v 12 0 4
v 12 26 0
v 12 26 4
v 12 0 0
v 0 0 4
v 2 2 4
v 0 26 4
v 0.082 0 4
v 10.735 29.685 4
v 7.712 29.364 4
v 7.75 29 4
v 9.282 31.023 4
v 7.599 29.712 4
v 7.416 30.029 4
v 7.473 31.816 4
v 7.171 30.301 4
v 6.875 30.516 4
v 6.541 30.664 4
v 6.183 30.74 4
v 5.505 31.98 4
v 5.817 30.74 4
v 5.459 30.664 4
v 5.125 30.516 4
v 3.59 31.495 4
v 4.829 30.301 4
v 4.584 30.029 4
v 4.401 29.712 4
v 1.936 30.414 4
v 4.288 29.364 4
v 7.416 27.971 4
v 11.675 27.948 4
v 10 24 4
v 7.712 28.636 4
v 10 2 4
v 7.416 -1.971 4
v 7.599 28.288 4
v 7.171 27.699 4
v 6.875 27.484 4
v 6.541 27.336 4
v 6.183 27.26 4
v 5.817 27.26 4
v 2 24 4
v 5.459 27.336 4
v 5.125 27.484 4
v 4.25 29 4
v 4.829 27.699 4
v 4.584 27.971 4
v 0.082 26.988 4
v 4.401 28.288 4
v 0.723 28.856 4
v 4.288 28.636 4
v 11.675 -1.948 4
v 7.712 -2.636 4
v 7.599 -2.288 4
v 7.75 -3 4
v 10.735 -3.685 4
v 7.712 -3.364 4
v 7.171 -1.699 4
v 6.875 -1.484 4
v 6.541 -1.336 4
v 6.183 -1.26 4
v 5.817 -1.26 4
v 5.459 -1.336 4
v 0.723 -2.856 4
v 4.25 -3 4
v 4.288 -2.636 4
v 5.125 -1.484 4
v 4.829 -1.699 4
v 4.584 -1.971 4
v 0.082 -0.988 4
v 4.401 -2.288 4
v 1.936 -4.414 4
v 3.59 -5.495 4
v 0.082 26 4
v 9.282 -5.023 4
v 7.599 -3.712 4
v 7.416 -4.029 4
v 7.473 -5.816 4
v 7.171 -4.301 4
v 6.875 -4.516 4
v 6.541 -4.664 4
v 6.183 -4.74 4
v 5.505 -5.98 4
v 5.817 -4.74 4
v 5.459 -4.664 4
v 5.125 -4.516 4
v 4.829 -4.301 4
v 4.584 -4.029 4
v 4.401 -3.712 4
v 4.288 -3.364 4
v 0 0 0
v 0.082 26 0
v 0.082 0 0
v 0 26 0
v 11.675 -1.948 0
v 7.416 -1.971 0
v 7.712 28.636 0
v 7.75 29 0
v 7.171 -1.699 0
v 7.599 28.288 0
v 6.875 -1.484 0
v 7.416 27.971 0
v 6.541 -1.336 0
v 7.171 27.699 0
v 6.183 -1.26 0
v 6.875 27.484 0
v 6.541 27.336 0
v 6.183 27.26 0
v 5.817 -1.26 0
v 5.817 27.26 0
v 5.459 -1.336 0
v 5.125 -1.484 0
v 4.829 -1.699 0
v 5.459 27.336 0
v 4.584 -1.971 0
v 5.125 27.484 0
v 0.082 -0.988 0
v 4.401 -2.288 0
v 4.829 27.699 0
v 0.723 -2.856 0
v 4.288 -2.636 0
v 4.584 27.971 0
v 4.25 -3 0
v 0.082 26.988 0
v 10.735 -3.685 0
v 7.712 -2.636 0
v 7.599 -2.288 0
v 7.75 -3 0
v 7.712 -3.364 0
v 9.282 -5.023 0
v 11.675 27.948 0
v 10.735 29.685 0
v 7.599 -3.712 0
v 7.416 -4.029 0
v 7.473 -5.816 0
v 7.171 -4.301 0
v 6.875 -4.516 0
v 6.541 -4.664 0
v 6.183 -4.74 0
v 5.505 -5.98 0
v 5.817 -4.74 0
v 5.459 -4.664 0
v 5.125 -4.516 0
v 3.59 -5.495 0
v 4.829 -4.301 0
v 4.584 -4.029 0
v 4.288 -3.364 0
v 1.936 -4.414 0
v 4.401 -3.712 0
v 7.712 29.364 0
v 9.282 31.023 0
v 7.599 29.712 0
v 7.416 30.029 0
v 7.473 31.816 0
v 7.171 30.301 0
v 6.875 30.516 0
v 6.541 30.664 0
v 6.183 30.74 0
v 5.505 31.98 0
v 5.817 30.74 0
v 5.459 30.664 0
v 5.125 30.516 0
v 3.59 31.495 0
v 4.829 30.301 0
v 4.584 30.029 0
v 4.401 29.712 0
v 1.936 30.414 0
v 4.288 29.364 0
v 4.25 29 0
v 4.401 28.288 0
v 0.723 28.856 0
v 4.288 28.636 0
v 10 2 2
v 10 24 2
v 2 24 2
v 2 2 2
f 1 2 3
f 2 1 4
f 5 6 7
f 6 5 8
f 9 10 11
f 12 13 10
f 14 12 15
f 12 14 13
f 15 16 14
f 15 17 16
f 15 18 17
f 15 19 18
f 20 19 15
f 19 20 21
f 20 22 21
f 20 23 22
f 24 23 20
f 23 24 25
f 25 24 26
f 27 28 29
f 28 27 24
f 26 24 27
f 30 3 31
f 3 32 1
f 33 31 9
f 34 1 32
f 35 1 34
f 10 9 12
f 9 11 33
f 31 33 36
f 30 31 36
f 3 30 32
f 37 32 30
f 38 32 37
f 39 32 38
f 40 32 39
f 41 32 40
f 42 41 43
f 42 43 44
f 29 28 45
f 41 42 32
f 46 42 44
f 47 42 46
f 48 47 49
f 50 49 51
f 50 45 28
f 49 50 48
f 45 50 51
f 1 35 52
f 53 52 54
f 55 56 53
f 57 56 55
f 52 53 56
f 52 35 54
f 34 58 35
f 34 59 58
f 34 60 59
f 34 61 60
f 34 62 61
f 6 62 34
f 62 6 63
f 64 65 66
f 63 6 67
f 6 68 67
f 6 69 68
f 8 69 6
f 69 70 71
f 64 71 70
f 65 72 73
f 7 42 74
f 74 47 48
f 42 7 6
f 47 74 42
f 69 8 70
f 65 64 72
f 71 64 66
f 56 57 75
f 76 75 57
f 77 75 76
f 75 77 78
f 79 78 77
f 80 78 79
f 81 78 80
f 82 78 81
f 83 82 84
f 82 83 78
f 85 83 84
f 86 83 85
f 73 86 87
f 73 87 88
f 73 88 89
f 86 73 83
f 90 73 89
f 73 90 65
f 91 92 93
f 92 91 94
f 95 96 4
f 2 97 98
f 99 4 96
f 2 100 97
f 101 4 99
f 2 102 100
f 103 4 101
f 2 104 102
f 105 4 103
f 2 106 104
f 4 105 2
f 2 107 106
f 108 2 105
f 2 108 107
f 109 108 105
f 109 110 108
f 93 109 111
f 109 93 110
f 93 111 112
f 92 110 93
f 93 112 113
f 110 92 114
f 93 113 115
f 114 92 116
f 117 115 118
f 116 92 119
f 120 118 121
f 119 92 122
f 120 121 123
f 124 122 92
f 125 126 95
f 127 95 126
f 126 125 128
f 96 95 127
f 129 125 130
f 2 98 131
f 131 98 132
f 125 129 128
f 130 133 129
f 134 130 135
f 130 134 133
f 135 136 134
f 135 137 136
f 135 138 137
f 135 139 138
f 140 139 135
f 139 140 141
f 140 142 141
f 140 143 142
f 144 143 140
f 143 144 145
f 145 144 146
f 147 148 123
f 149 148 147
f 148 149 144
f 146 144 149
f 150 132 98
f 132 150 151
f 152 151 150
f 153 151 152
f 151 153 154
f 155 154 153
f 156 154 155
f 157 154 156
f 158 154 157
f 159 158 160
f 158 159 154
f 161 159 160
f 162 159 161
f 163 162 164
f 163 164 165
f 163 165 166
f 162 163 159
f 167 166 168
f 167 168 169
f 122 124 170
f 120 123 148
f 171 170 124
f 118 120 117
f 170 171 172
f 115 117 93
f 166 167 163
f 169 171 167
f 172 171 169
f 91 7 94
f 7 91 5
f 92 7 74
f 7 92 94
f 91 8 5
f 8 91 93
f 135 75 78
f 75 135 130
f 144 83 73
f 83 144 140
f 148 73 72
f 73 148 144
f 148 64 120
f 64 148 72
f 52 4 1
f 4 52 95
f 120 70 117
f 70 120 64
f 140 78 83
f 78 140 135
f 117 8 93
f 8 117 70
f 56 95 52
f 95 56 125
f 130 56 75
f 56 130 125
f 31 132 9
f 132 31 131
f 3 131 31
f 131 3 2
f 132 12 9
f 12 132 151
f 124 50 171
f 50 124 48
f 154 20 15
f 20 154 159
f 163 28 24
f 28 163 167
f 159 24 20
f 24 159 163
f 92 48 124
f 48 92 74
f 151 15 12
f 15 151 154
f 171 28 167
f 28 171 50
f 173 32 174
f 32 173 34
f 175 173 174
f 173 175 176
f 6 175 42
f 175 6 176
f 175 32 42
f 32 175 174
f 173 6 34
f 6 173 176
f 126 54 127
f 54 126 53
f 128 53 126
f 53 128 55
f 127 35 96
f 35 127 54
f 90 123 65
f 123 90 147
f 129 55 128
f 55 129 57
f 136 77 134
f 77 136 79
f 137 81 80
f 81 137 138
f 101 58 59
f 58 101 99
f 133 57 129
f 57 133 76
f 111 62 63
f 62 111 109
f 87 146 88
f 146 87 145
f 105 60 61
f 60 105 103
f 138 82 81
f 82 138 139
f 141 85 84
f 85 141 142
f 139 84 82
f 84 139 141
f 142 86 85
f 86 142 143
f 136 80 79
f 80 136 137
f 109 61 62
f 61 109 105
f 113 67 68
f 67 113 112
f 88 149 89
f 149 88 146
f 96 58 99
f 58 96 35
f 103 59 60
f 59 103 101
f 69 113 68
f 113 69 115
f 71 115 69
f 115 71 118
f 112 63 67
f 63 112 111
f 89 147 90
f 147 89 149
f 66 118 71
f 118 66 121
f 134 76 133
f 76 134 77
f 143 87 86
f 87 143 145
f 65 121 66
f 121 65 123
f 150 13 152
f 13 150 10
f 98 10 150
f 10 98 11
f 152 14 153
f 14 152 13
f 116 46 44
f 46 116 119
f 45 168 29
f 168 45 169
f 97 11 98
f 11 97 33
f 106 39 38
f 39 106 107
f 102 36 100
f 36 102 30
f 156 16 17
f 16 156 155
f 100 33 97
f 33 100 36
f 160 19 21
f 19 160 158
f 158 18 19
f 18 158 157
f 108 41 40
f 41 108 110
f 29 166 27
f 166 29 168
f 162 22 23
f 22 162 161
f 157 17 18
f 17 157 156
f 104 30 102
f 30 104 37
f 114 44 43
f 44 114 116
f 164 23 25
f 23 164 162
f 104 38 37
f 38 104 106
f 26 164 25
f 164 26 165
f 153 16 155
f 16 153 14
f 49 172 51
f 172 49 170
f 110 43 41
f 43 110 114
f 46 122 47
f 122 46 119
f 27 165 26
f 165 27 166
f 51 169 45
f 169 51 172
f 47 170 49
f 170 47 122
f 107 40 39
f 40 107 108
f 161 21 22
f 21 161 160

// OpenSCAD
difference()
{
    union()
    {
        cube([12,26,4]);
        translate([6,-0,0]) cylinder(4, 6,6);
        translate([6,26,0]) cylinder(4, 6,6);
    }

    translate([2,2,2]) cube([8,22,8]);




    translate([6, -3, -1]) cylinder(6, 1.75, 1.75, $fn=30);
    translate([6, 29, -1]) cylinder(6, 1.75, 1.75, $fn=30);
}
